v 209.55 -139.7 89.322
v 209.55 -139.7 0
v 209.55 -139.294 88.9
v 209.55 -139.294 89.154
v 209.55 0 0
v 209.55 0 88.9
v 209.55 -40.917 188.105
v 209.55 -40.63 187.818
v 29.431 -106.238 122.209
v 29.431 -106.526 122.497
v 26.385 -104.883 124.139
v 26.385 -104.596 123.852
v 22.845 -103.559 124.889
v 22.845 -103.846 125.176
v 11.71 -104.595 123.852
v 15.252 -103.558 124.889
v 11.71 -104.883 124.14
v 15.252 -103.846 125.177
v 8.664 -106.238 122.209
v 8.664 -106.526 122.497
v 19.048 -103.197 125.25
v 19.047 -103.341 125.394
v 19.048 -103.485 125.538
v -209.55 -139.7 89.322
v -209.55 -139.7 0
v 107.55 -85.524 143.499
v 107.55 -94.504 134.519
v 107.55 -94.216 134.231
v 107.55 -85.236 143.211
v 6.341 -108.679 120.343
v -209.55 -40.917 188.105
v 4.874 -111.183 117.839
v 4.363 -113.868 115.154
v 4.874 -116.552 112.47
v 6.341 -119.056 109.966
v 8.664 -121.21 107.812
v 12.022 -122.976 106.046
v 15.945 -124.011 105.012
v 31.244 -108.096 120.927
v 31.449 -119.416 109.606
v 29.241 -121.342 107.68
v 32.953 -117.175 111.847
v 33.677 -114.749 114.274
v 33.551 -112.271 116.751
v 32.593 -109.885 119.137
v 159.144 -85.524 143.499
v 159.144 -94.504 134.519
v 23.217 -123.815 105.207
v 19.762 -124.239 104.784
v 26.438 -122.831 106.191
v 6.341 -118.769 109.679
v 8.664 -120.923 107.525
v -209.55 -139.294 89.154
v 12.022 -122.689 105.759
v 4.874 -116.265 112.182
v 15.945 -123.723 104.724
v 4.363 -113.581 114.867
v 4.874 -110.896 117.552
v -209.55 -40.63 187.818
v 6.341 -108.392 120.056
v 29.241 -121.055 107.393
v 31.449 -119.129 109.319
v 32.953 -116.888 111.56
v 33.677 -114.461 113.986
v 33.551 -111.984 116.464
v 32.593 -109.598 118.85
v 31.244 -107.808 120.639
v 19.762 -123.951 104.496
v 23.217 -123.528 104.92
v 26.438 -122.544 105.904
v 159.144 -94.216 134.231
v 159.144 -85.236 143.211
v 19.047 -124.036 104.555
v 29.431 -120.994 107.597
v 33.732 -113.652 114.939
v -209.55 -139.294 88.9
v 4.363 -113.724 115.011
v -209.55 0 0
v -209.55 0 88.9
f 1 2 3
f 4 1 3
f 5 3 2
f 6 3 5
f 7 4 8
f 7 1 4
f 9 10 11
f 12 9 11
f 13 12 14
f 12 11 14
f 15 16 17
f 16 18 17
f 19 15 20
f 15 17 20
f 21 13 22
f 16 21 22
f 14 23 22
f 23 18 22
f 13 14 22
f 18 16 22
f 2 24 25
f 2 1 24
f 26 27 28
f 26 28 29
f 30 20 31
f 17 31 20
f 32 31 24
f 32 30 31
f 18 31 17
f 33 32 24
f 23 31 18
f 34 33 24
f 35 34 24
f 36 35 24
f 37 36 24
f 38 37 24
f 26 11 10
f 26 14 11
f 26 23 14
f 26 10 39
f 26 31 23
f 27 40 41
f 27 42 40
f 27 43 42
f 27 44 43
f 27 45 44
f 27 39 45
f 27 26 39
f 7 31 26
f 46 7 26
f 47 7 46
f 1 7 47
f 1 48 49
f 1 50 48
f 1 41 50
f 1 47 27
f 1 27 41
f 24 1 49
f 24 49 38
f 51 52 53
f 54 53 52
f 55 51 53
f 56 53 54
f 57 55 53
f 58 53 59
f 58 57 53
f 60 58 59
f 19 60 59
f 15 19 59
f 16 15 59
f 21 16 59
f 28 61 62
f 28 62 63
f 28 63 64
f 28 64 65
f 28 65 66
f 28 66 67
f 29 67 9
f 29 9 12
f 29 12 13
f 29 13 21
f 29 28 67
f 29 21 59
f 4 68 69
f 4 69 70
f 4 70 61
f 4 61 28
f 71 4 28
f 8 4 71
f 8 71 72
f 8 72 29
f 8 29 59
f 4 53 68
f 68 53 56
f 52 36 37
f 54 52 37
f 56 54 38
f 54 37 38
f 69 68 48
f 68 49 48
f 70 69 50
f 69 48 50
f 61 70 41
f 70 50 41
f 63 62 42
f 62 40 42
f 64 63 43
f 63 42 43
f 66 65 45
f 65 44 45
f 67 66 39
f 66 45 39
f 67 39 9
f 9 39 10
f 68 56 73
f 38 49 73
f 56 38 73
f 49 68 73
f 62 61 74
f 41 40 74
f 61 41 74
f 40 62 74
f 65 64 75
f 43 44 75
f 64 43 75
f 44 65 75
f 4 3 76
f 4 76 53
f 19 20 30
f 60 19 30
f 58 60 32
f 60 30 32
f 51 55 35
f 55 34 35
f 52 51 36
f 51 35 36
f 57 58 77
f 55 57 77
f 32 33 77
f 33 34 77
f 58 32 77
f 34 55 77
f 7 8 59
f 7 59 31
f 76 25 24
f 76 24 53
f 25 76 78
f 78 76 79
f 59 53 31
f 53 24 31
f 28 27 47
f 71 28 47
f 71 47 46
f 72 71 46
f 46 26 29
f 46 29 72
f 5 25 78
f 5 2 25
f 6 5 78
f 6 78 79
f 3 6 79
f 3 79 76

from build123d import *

# Parameters (mm, degrees)
F1_DEPTH = 209.55
F2_W     = 51.59375
F2_H     = 12.7
F3_DEPTH = 0.4064


# Not quite as in the source:
# - the dataset's text gives a spline's control points without its knots; the knots are read off the source's solid


with BuildPart() as f1:
    # F0 (on Right) → F1 (new body, symmetric)
    with BuildSketch(Plane.YZ):
        Polygon((-139.7, 0), (0, 0), (0, 88.9), (-139.2936, 88.9), (-139.2936, 89.154), (-40.6298144724, 187.8177855276), (-40.9171826682, 188.1051537235), (-139.7, 89.3223363917), align=None)
    extrude(amount=F1_DEPTH, both=True)

    # F2 (on face) → F3 (cut, through all)
    with BuildSketch(Plane(origin=(0, -114.5111681959, 114.5111681959), x_dir=(1, 0, 0), z_dir=(0, -0.7071067812, 0.7071067812))):
        with Locations((133.3471488731, 34.6446699547)):
            Rectangle(F2_W, F2_H)
        with BuildLine():
            add(Edge.make_bspline(
                [(29.4310752731, 11.2932815547), (26.7125386731, 14.0114625547), (22.8919722731, 15.5939587547), (19.0471996731, 15.5939587547)],
                knots=[7, 7, 7, 7, 8, 8, 8, 8], degree=3))
            add(Edge.make_bspline(
                [(19.0471996731, 15.5939587547), (15.2031636731, 15.5939587547), (11.3825972731, 14.0114625547), (8.6636796731, 11.2932815547)],
                knots=[0, 0, 0, 0, 1, 1, 1, 1], degree=3))
            add(Edge.make_bspline(
                [(8.6636796731, 11.2932815547), (5.9454986731, 8.5747703547), (4.3628246731, 4.7539753547), (4.3628246731, 0.9095837547), (4.3628246731, -2.9346046453), (5.9454986731, -6.7553996453), (8.6636796731, -9.4735806453)],
                knots=[1, 1, 1, 1, 2, 2, 2, 3, 3, 3, 3], degree=3))
            add(Edge.make_bspline(
                [(8.6636796731, -9.4735806453), (11.3825972731, -12.1920918453), (15.2031636731, -13.7747912453), (19.0471996731, -13.7747912453), (22.8919722731, -13.7747912453), (26.7125386731, -12.1920918453), (29.4310752731, -9.4735806453), (32.1492816731, -6.7553996453), (33.7315746731, -2.9346046453), (33.7315746731, 0.9095837547), (33.7315746731, 4.7539753547), (32.1492816731, 8.5747703547), (29.4310752731, 11.2932815547)],
                knots=[3, 3, 3, 3, 4, 4, 4, 5, 5, 5, 6, 6, 6, 7, 7, 7, 7], degree=3))
        make_face()
    extrude(amount=-F3_DEPTH, mode=Mode.SUBTRACT)


solid = f1.part
